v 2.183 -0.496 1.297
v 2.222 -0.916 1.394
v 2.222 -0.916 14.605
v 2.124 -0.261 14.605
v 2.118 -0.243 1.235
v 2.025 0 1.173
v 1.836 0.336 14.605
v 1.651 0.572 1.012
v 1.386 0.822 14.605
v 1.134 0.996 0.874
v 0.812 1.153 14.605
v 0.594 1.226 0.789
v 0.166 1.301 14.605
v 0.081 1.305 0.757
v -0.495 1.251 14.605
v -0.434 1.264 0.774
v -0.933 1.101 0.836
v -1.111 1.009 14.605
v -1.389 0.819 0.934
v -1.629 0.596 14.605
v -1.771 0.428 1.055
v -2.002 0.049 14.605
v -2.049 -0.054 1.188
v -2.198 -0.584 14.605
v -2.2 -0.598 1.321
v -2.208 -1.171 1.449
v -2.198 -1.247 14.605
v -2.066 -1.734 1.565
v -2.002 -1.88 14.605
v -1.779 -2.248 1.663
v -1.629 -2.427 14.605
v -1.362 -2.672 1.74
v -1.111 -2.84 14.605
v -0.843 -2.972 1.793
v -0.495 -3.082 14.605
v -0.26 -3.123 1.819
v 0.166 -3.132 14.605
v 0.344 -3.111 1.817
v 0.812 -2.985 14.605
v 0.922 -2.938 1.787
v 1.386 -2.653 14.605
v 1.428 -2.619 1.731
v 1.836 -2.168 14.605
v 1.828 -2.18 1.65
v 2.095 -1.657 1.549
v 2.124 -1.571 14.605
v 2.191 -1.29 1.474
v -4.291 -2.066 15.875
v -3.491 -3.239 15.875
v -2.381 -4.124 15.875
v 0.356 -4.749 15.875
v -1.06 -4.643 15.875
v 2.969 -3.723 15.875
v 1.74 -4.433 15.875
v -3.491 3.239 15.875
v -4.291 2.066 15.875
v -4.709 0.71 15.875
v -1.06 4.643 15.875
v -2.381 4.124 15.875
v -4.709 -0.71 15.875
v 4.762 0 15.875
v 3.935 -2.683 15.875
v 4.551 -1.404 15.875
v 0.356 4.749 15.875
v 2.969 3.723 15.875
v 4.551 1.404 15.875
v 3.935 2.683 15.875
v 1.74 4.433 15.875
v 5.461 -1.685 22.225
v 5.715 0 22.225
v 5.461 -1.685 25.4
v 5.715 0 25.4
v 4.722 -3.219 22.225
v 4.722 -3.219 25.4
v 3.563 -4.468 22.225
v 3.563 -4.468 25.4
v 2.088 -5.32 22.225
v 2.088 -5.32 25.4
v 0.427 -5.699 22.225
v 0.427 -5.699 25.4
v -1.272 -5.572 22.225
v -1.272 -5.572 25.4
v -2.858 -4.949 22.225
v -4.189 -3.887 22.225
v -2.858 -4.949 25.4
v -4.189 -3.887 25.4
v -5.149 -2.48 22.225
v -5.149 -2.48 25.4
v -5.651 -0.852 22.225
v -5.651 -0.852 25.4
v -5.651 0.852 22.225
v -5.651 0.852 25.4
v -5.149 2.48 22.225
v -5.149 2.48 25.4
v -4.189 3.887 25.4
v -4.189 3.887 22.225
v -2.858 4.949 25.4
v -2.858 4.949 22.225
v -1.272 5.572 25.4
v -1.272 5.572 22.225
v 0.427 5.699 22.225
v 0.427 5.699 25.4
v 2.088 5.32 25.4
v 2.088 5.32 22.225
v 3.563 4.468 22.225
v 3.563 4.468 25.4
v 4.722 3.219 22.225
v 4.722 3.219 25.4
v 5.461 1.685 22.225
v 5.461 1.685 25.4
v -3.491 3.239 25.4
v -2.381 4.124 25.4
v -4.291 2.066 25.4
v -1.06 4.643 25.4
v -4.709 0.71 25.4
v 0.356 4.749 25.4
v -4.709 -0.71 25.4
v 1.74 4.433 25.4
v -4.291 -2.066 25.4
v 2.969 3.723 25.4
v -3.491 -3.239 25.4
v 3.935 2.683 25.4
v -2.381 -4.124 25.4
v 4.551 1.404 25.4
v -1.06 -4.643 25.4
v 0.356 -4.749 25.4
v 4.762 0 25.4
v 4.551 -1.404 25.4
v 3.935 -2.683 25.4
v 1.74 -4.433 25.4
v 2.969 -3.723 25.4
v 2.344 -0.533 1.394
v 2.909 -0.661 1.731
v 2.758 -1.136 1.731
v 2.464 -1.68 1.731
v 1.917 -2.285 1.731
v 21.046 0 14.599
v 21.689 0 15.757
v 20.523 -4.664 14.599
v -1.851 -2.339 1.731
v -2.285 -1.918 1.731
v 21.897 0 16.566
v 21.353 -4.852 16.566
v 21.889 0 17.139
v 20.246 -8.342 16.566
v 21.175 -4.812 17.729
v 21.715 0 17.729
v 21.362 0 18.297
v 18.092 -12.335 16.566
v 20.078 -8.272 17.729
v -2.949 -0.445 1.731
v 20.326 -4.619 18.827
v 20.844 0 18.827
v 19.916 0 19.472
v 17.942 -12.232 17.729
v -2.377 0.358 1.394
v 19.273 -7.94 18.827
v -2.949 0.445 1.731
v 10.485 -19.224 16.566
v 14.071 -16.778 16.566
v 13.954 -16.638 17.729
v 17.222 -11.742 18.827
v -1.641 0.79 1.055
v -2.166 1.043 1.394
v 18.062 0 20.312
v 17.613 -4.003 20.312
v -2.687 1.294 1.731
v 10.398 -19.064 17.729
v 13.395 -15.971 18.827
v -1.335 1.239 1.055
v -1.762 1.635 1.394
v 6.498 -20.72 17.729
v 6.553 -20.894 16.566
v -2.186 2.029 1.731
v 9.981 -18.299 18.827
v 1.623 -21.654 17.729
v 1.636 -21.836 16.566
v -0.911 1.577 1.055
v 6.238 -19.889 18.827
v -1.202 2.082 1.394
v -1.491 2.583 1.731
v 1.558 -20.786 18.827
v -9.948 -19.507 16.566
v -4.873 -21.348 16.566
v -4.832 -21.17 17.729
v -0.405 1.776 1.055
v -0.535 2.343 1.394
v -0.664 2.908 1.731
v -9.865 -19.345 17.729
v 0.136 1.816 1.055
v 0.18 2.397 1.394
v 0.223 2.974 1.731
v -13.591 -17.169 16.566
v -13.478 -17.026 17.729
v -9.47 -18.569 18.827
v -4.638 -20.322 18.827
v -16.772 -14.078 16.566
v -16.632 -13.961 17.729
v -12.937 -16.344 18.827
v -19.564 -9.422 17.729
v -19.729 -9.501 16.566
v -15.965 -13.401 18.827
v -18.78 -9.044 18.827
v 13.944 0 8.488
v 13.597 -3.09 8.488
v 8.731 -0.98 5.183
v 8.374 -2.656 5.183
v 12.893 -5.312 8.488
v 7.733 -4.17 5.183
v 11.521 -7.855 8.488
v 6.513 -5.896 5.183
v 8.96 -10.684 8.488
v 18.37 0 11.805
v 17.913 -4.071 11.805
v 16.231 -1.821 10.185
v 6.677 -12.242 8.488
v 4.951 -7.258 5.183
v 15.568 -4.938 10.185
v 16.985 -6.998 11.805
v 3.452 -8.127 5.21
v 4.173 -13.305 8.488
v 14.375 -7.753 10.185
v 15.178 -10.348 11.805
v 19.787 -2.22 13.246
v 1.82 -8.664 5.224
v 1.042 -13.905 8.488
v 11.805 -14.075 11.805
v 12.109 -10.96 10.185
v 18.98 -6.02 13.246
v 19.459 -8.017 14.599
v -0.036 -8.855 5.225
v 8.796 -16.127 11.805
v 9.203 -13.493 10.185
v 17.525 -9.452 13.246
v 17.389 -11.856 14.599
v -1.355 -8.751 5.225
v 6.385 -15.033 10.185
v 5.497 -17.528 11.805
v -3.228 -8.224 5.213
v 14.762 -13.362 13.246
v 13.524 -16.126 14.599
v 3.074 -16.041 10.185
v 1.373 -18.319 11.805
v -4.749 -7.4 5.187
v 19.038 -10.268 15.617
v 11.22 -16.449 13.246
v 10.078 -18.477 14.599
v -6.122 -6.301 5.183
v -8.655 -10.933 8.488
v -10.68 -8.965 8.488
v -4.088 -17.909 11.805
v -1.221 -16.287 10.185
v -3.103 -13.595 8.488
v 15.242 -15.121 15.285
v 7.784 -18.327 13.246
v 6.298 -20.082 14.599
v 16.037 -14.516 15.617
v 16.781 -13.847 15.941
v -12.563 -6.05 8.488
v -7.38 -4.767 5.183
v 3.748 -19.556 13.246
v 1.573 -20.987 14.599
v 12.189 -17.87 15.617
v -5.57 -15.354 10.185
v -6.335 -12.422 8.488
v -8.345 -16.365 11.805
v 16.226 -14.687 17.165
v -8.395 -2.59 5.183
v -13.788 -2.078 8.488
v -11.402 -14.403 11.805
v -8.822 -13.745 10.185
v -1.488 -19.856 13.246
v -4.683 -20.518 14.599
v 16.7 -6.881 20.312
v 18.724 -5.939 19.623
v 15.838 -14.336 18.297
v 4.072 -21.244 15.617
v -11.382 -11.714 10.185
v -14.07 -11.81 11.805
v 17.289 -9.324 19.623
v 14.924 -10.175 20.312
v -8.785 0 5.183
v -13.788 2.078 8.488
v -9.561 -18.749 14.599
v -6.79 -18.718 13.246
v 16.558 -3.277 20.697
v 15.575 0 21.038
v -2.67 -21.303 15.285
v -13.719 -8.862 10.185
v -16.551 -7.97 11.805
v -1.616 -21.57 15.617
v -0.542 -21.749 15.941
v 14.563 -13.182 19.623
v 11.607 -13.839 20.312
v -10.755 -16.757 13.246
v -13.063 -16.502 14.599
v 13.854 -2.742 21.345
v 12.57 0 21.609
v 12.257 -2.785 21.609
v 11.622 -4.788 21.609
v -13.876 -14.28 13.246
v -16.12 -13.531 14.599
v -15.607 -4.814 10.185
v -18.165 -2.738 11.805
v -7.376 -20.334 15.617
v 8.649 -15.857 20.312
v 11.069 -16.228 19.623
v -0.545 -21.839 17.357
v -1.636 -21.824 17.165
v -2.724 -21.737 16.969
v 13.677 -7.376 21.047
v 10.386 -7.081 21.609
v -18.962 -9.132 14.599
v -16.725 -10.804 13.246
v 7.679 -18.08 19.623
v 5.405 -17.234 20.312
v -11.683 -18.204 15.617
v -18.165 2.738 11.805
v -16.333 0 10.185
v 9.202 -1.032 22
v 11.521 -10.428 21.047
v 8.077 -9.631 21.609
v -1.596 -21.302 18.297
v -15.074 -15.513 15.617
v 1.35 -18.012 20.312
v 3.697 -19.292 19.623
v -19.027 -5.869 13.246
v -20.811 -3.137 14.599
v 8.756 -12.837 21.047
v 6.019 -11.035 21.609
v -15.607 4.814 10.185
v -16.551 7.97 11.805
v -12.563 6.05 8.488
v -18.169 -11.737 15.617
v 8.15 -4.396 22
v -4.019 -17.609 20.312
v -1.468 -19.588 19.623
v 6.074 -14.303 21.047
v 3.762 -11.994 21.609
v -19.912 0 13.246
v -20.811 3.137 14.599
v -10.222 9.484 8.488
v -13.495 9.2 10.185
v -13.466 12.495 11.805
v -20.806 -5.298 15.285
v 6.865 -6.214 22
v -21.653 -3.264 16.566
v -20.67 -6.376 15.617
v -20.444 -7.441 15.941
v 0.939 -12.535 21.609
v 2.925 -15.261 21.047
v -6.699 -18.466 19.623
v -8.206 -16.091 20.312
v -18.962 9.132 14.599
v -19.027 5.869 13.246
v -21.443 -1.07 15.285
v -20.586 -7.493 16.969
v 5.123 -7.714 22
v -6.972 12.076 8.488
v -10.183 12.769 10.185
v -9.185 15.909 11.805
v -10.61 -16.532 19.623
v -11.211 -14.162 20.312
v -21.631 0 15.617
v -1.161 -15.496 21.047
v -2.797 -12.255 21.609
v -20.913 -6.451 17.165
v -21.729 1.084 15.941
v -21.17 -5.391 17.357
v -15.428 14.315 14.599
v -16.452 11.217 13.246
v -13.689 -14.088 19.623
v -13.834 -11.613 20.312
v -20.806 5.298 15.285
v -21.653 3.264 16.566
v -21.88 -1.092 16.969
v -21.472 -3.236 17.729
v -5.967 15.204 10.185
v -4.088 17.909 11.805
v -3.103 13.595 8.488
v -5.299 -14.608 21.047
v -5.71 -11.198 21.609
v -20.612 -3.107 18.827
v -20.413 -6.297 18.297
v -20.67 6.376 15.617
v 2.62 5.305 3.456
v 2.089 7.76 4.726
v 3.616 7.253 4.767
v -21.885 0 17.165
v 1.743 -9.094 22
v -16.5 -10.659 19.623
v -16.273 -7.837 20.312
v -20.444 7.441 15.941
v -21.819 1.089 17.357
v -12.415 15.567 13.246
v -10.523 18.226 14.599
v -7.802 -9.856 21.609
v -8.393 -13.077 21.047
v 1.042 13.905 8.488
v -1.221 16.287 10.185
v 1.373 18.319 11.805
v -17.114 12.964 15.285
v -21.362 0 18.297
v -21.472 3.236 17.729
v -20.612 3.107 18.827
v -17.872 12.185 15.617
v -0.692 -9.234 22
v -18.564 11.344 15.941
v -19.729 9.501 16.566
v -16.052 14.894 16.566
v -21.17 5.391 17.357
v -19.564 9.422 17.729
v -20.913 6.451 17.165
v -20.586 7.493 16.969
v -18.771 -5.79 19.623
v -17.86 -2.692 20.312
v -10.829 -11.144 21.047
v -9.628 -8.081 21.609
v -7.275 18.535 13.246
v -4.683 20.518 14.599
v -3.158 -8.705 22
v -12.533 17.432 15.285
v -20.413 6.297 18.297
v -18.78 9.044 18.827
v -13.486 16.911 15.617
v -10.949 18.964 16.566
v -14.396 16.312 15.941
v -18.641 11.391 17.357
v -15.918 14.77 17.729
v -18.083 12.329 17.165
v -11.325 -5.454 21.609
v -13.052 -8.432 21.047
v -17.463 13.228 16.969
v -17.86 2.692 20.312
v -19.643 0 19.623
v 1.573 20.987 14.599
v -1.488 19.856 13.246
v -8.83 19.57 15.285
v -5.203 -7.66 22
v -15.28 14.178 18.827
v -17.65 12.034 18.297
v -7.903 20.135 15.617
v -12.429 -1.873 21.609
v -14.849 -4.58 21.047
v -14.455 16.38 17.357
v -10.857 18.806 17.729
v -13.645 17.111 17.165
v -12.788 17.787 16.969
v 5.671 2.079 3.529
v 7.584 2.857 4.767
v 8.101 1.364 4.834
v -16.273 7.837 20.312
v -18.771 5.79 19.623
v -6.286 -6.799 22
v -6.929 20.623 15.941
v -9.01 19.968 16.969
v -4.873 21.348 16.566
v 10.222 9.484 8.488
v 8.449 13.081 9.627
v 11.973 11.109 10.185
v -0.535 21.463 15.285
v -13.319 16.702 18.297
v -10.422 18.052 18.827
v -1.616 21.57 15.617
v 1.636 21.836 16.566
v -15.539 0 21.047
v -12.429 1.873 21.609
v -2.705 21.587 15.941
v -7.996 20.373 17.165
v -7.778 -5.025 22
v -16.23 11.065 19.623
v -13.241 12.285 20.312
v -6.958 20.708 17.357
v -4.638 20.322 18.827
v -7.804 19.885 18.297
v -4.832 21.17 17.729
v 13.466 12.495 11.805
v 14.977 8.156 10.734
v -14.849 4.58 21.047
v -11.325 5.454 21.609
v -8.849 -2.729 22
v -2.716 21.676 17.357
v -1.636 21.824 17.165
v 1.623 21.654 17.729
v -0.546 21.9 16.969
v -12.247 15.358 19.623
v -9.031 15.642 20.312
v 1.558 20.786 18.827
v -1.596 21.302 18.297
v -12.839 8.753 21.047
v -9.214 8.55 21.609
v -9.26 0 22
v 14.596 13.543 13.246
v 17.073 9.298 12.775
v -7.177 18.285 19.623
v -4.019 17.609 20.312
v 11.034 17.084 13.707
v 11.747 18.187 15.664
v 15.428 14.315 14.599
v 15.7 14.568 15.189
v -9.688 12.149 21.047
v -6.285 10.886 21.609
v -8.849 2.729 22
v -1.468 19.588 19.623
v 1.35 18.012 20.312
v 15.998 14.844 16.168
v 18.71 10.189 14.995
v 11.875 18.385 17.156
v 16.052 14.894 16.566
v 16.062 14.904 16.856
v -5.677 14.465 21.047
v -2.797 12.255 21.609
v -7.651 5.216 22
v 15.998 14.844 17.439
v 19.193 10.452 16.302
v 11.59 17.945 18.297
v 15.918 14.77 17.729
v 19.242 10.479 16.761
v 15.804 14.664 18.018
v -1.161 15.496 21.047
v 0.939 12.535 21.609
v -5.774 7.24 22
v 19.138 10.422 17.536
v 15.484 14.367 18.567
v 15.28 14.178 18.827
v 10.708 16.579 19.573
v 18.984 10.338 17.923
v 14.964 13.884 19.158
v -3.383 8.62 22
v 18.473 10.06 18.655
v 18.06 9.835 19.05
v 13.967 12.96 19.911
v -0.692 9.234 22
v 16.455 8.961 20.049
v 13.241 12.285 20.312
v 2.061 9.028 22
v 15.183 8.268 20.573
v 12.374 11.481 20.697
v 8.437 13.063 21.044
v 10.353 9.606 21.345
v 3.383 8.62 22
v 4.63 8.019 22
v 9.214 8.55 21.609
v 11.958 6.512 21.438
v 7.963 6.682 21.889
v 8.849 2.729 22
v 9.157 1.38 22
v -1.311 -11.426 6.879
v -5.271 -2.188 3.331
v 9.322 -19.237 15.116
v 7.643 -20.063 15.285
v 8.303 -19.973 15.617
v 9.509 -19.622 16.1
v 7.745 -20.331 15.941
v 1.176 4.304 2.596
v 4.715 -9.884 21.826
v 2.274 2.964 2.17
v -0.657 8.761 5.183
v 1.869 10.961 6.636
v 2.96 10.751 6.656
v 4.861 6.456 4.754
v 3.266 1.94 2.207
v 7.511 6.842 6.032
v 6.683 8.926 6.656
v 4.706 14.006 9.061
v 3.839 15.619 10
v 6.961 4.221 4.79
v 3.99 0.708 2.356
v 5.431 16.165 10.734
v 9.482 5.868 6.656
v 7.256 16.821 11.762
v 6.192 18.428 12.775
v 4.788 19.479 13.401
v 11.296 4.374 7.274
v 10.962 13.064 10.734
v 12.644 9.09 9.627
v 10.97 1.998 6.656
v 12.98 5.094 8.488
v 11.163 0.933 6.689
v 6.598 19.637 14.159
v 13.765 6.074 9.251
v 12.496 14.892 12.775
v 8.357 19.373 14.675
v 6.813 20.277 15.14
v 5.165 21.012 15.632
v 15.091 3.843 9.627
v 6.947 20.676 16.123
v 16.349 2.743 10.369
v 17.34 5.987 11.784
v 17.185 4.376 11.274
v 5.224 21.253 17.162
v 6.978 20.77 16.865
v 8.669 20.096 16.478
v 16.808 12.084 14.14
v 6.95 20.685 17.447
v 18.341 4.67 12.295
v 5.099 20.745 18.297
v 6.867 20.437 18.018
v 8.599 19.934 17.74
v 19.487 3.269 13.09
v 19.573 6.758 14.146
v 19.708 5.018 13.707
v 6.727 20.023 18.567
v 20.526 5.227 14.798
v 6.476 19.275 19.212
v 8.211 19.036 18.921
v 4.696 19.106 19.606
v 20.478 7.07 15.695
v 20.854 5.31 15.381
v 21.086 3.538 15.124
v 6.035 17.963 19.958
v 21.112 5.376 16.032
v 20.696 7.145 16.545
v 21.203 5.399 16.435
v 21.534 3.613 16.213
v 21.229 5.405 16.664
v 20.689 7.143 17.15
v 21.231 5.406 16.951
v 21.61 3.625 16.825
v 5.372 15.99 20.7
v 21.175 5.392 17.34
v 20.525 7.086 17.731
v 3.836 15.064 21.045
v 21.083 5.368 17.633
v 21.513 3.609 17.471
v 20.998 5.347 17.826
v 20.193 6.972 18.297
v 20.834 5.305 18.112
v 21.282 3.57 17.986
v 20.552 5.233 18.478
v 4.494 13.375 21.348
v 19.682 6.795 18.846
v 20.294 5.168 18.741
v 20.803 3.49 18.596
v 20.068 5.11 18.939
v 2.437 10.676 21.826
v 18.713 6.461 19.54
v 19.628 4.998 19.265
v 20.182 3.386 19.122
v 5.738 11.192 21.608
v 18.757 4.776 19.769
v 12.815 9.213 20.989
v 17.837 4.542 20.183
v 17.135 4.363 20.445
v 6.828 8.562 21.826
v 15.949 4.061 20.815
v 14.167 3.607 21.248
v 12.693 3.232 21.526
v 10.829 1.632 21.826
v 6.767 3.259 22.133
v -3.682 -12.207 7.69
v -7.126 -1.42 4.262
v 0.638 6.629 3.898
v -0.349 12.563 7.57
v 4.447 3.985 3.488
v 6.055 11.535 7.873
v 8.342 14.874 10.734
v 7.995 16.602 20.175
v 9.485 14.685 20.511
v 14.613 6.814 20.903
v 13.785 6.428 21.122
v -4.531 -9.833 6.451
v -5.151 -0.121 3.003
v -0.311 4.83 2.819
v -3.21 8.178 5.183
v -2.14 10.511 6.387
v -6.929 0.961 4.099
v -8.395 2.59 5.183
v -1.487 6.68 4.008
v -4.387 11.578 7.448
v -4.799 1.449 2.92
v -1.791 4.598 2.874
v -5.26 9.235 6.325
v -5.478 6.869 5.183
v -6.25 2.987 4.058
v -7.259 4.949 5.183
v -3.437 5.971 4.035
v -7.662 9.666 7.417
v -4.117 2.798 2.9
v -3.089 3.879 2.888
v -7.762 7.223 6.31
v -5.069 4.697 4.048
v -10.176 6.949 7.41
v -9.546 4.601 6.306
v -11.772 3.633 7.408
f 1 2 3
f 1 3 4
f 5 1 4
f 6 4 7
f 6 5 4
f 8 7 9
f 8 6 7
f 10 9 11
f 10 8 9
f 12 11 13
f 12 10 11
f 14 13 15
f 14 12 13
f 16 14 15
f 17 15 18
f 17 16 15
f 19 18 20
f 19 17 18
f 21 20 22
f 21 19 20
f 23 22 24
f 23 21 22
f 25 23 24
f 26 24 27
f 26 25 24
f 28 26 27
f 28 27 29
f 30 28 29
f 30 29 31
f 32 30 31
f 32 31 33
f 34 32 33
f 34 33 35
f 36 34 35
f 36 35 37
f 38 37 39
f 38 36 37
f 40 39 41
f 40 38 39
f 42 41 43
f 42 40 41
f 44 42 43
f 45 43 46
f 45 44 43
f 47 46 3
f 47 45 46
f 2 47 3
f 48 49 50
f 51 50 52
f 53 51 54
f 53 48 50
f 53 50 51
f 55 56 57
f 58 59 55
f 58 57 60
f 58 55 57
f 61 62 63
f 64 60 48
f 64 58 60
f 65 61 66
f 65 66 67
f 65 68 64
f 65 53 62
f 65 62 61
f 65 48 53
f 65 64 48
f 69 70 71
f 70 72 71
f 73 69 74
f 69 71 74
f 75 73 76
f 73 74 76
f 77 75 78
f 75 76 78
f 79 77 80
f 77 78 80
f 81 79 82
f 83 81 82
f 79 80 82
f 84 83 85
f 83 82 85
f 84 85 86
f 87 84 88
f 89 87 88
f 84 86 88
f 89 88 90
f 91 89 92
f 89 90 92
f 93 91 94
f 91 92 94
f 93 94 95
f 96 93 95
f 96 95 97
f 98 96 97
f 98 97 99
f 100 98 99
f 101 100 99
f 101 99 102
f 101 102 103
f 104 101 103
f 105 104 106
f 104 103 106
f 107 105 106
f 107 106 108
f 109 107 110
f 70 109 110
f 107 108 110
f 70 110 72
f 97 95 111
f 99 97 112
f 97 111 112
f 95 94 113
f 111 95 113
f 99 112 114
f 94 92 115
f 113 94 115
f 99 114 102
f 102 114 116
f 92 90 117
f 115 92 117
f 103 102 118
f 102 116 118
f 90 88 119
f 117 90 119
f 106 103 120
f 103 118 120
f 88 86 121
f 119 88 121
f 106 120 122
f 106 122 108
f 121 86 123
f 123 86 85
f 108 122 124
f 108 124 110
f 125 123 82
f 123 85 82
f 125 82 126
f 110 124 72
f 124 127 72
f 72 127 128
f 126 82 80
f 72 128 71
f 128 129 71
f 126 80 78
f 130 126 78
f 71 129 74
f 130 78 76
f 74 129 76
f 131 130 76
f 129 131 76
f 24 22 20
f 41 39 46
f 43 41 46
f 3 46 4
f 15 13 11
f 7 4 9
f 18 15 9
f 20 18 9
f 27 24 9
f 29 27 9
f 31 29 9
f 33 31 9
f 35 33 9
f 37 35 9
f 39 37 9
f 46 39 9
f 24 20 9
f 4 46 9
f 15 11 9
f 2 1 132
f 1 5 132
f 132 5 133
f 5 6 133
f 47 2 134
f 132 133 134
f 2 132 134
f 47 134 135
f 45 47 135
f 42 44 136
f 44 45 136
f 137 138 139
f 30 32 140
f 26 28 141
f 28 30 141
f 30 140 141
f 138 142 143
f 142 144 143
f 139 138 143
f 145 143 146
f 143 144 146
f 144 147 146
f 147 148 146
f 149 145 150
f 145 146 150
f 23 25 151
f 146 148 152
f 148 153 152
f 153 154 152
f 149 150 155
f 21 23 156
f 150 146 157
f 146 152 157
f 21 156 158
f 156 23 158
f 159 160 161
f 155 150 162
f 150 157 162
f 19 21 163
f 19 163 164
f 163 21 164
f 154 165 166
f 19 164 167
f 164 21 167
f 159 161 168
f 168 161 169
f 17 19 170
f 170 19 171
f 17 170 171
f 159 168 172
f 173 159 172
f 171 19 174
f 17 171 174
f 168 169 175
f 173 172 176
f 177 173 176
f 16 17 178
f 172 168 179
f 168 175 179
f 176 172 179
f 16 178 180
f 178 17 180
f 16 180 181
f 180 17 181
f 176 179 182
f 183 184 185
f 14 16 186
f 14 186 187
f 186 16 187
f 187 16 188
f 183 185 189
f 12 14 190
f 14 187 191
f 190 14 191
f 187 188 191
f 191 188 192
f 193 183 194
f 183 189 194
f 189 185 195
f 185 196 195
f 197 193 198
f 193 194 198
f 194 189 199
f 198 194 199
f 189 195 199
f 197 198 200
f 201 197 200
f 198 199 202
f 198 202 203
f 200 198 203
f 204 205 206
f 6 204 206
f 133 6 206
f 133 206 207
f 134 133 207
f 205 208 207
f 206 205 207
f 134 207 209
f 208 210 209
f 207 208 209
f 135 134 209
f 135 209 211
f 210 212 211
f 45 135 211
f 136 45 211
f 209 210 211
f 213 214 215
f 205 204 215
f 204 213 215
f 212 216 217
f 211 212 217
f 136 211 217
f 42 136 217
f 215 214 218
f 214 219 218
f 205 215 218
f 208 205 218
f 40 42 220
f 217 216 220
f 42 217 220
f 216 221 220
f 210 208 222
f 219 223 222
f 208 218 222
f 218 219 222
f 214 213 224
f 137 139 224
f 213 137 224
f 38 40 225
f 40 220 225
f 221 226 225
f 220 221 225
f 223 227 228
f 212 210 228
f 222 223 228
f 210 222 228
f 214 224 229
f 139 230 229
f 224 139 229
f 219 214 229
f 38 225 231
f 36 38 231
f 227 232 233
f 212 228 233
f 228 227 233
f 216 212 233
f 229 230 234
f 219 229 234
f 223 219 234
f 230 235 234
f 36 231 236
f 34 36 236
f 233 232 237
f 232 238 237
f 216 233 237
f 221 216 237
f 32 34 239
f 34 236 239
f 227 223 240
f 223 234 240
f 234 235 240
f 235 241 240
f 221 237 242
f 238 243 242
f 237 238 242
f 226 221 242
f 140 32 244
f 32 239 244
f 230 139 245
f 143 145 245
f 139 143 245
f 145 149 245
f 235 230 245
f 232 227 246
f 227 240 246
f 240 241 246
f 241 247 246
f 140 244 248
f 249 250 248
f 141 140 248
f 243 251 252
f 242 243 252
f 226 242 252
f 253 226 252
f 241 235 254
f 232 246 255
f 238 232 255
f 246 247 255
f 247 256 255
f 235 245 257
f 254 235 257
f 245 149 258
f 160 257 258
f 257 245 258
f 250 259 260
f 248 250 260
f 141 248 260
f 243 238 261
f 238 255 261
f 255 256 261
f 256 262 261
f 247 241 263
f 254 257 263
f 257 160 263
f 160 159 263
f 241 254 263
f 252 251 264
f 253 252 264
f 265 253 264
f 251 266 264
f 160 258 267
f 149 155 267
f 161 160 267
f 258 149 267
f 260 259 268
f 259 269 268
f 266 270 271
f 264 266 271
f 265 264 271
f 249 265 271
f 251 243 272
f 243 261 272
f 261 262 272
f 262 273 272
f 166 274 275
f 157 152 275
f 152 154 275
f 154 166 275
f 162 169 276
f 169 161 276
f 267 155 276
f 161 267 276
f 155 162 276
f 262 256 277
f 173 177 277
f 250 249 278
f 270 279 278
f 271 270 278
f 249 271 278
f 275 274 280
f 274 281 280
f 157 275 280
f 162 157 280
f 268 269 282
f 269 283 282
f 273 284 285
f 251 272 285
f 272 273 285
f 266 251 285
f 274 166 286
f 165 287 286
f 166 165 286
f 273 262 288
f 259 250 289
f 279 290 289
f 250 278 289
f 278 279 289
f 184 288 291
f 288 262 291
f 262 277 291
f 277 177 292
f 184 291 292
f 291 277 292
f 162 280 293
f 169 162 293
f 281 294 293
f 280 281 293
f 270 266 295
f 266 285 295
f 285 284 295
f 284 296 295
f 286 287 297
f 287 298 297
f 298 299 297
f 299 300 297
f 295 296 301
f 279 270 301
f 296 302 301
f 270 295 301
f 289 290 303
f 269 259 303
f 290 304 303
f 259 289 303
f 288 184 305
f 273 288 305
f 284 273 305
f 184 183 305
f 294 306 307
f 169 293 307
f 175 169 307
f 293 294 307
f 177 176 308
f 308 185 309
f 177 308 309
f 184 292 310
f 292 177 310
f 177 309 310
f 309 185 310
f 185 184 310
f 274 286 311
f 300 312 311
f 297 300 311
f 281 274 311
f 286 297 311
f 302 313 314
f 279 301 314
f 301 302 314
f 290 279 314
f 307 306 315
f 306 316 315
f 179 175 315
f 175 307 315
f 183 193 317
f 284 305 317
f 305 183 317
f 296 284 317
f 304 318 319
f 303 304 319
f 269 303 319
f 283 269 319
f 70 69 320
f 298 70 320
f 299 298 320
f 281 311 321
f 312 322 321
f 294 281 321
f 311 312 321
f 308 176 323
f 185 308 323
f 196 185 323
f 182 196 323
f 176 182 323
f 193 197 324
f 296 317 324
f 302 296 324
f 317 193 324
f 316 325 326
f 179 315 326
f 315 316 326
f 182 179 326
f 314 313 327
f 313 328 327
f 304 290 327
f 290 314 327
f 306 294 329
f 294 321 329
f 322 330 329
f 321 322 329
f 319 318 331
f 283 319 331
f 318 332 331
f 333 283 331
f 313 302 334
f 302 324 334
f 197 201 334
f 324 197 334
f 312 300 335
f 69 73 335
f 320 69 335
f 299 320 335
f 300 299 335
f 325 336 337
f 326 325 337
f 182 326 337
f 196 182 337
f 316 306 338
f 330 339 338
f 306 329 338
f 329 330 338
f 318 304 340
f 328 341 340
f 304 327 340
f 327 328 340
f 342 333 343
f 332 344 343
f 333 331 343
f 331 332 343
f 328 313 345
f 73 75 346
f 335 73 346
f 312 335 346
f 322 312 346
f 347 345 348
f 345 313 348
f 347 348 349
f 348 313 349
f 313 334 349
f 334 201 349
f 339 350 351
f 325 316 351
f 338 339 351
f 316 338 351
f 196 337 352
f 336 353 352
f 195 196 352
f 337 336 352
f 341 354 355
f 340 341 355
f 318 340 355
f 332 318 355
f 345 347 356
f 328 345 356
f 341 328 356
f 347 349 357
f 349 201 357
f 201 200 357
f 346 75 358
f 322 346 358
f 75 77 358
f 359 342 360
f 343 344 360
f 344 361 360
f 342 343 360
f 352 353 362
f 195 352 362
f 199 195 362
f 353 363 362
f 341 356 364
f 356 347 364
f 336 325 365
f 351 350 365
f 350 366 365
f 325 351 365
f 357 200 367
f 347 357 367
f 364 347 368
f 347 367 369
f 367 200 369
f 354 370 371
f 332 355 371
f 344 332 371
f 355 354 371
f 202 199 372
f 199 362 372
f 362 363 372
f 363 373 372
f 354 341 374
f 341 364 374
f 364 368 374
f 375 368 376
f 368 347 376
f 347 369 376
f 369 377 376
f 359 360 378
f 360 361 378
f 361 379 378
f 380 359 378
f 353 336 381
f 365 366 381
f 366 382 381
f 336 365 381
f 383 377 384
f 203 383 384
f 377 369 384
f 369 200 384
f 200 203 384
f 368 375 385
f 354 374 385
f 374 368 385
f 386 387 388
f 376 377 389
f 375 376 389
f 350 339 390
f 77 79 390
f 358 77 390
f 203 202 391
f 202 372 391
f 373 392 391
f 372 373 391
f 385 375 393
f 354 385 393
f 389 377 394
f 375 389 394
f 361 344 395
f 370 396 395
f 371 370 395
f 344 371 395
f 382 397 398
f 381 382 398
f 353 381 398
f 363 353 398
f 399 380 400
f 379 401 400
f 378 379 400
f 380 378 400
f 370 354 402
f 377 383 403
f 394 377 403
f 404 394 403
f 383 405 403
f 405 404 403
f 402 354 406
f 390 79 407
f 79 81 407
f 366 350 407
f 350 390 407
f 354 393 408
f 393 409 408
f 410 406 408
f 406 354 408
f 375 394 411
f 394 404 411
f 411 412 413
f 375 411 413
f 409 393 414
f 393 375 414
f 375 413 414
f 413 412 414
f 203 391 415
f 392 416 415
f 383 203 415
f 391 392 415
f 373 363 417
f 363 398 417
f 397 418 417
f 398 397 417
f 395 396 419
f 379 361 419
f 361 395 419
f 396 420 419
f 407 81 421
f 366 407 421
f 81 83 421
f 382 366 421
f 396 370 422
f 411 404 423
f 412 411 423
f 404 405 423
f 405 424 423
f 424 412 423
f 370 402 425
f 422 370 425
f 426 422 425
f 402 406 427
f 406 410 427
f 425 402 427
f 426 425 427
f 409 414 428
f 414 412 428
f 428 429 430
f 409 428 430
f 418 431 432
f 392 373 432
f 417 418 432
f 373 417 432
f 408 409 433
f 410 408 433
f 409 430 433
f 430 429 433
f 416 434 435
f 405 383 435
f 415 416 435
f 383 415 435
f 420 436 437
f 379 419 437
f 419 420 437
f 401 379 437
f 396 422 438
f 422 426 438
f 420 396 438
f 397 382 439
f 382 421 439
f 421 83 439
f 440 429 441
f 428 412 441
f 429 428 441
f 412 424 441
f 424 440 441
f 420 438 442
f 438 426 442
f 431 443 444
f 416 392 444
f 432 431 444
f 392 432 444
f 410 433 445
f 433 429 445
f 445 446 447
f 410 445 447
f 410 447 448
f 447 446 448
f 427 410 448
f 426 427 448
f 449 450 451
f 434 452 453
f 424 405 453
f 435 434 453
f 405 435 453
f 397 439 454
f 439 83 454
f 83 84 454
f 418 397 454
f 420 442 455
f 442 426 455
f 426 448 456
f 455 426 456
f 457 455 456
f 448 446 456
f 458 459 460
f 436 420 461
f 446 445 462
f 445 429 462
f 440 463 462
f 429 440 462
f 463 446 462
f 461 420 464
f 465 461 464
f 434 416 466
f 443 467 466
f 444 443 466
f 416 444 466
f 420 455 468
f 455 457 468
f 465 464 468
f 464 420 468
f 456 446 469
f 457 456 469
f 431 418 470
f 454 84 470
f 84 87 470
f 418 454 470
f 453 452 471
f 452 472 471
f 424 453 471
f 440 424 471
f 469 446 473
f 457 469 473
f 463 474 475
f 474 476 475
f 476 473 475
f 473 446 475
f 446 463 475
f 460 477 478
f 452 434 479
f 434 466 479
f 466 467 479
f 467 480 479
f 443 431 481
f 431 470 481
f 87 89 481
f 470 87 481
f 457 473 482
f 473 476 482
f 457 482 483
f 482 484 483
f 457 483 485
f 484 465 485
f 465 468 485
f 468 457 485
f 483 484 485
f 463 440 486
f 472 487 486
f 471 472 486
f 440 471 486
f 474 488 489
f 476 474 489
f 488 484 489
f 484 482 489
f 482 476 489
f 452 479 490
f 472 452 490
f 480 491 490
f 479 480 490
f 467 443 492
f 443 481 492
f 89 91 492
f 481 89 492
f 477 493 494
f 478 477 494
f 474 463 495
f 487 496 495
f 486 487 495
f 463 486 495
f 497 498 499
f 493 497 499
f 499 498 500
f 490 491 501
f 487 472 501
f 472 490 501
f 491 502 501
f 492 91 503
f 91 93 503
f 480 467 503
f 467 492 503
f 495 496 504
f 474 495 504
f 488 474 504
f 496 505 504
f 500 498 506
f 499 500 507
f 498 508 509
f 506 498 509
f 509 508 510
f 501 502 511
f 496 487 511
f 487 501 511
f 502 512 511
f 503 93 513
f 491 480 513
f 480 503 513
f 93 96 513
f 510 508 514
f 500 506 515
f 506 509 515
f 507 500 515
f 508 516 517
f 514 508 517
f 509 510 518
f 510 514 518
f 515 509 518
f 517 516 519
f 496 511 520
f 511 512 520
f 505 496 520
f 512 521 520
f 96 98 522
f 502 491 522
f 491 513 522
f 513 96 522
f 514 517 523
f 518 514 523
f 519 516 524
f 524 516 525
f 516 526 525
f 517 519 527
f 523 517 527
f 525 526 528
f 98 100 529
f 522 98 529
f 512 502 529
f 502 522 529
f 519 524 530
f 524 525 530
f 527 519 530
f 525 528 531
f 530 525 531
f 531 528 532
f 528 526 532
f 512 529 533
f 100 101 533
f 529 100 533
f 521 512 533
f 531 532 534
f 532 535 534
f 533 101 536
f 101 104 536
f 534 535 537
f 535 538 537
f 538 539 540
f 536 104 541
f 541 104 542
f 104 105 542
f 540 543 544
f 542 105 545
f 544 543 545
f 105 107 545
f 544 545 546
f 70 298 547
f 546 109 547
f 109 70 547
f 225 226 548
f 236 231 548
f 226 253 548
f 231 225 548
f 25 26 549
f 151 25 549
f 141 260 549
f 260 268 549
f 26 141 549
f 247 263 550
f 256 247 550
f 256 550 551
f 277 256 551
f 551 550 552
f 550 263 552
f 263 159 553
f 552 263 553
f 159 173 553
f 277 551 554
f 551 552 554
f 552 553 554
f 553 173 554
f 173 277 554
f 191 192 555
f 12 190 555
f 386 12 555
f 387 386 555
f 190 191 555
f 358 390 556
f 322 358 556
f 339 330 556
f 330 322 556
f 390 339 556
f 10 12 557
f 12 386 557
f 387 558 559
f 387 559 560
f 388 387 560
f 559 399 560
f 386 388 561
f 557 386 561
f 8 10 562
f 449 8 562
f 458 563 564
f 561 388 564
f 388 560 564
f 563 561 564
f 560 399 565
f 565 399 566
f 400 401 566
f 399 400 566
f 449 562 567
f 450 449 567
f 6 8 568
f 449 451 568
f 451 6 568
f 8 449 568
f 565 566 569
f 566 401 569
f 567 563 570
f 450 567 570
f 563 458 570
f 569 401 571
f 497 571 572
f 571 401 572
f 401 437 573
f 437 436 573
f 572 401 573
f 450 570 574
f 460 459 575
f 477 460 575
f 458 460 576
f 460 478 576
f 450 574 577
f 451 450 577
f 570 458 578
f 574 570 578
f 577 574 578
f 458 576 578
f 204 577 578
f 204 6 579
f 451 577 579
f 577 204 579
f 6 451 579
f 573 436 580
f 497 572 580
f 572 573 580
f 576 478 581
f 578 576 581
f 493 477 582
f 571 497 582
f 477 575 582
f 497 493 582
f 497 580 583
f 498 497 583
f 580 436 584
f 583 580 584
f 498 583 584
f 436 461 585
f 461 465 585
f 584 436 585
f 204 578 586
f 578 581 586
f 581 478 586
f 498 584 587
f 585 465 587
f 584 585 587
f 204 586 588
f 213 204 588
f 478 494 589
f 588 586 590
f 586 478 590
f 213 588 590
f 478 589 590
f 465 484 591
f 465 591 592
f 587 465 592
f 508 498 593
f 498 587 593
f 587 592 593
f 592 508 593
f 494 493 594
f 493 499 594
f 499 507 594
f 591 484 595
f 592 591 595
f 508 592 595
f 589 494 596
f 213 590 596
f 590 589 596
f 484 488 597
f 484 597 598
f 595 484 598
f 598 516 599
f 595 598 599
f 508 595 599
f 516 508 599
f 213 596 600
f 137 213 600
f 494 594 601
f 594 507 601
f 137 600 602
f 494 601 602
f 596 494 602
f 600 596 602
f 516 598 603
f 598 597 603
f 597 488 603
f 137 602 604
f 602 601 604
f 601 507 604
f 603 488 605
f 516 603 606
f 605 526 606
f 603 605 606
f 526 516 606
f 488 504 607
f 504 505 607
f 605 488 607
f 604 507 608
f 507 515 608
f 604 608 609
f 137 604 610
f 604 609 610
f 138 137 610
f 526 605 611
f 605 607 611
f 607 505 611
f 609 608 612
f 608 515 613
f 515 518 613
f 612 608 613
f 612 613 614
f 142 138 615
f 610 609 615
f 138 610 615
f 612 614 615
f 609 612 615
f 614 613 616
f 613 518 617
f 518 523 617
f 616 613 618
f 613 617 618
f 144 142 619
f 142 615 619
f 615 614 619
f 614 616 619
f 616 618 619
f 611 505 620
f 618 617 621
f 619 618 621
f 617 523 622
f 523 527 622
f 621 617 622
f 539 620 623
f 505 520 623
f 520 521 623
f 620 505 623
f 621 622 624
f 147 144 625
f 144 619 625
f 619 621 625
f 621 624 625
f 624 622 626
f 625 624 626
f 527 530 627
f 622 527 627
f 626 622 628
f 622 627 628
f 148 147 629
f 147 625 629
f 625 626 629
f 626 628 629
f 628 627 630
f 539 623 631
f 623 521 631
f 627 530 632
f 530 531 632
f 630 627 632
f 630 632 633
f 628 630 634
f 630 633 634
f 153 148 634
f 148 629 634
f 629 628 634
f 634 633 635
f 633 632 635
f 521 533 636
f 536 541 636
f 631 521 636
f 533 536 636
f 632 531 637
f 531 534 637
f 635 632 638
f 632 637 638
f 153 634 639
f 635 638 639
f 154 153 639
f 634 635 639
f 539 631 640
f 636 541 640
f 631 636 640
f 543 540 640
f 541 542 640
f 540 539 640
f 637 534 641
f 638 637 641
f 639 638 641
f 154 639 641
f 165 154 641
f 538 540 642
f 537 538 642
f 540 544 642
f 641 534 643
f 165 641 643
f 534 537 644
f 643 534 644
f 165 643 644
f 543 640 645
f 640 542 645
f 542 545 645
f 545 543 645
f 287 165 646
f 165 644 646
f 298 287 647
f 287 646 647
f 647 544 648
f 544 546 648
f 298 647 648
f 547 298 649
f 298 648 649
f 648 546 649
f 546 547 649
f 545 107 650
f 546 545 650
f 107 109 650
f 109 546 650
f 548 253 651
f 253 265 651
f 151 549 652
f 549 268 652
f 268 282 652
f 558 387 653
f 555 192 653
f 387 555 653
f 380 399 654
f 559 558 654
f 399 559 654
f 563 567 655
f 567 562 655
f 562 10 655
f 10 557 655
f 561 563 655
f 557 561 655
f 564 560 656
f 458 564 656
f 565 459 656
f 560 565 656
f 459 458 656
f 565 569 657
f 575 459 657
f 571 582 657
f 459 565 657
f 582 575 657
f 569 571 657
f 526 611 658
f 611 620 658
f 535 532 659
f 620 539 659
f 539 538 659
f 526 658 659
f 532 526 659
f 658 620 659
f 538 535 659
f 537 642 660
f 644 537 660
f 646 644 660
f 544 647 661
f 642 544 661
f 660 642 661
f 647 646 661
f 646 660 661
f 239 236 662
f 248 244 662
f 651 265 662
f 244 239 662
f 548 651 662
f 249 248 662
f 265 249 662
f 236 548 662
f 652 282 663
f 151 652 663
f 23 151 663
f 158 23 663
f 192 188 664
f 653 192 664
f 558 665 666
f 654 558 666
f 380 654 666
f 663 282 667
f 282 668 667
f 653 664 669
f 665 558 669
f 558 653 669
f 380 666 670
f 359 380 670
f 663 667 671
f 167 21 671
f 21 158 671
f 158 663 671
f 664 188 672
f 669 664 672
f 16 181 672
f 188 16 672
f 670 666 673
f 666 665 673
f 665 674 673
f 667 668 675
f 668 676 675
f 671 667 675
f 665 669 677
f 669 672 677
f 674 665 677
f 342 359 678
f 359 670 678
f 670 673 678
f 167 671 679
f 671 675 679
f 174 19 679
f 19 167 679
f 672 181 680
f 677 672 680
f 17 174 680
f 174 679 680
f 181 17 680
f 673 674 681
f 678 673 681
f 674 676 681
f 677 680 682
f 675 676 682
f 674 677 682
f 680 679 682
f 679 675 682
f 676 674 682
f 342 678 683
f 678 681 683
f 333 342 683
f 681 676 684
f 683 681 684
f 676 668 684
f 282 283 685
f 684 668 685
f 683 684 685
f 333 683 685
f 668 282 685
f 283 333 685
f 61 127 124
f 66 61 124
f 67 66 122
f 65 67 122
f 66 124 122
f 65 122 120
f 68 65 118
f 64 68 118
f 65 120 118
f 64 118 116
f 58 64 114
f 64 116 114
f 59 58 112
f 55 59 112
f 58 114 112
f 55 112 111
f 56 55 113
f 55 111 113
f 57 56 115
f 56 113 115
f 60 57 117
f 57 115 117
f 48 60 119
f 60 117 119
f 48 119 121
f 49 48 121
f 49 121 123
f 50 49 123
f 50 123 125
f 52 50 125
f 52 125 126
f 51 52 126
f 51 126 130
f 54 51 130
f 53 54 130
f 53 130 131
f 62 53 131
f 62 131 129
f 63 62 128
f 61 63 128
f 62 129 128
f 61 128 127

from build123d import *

# Parameters (mm, degrees)
F2_R     = 4.7625
F3_DEPTH = 9.525
F4_R     = 2.2225
F5_DEPTH = 14.605


# Not quite as in the source:
# - a feature names something its author has since deleted; it is built from what else it names


with BuildPart() as f1:
    # F0 (on Front) → F1 (revolve)
    with BuildSketch(Plane.XZ):
        with BuildLine():
            Line((0, 25.4), (0, 0))
            add(Edge.make_bspline(
                [(0, 0), (11.4623733169, 6.6295765693), (30.9367325307, 18.1147399727), (14.1349324056, 21.8956786186), (5.715, 22.225)],
                knots=[0, 0, 0, 0, 0.5612625766, 1, 1, 1, 1], degree=3))
            Line((5.715, 22.225), (5.715, 25.4))
            Line((5.715, 25.4), (0, 25.4))
        make_face()
    revolve(axis=Axis((0, 0, 12.7), (0, 0, -1)))

    # F2 (on face) → F3 (cut)
    with BuildSketch(Plane.XY.offset(25.4)):
        Circle(F2_R)
    extrude(amount=-F3_DEPTH, mode=Mode.SUBTRACT)

    # F4 (on Top) → F5 (cut)
    with BuildSketch(Plane.XY):
        with Locations((0, -0.9156785202)):
            Circle(F4_R)
    extrude(amount=F5_DEPTH, mode=Mode.SUBTRACT)


solid = f1.part
